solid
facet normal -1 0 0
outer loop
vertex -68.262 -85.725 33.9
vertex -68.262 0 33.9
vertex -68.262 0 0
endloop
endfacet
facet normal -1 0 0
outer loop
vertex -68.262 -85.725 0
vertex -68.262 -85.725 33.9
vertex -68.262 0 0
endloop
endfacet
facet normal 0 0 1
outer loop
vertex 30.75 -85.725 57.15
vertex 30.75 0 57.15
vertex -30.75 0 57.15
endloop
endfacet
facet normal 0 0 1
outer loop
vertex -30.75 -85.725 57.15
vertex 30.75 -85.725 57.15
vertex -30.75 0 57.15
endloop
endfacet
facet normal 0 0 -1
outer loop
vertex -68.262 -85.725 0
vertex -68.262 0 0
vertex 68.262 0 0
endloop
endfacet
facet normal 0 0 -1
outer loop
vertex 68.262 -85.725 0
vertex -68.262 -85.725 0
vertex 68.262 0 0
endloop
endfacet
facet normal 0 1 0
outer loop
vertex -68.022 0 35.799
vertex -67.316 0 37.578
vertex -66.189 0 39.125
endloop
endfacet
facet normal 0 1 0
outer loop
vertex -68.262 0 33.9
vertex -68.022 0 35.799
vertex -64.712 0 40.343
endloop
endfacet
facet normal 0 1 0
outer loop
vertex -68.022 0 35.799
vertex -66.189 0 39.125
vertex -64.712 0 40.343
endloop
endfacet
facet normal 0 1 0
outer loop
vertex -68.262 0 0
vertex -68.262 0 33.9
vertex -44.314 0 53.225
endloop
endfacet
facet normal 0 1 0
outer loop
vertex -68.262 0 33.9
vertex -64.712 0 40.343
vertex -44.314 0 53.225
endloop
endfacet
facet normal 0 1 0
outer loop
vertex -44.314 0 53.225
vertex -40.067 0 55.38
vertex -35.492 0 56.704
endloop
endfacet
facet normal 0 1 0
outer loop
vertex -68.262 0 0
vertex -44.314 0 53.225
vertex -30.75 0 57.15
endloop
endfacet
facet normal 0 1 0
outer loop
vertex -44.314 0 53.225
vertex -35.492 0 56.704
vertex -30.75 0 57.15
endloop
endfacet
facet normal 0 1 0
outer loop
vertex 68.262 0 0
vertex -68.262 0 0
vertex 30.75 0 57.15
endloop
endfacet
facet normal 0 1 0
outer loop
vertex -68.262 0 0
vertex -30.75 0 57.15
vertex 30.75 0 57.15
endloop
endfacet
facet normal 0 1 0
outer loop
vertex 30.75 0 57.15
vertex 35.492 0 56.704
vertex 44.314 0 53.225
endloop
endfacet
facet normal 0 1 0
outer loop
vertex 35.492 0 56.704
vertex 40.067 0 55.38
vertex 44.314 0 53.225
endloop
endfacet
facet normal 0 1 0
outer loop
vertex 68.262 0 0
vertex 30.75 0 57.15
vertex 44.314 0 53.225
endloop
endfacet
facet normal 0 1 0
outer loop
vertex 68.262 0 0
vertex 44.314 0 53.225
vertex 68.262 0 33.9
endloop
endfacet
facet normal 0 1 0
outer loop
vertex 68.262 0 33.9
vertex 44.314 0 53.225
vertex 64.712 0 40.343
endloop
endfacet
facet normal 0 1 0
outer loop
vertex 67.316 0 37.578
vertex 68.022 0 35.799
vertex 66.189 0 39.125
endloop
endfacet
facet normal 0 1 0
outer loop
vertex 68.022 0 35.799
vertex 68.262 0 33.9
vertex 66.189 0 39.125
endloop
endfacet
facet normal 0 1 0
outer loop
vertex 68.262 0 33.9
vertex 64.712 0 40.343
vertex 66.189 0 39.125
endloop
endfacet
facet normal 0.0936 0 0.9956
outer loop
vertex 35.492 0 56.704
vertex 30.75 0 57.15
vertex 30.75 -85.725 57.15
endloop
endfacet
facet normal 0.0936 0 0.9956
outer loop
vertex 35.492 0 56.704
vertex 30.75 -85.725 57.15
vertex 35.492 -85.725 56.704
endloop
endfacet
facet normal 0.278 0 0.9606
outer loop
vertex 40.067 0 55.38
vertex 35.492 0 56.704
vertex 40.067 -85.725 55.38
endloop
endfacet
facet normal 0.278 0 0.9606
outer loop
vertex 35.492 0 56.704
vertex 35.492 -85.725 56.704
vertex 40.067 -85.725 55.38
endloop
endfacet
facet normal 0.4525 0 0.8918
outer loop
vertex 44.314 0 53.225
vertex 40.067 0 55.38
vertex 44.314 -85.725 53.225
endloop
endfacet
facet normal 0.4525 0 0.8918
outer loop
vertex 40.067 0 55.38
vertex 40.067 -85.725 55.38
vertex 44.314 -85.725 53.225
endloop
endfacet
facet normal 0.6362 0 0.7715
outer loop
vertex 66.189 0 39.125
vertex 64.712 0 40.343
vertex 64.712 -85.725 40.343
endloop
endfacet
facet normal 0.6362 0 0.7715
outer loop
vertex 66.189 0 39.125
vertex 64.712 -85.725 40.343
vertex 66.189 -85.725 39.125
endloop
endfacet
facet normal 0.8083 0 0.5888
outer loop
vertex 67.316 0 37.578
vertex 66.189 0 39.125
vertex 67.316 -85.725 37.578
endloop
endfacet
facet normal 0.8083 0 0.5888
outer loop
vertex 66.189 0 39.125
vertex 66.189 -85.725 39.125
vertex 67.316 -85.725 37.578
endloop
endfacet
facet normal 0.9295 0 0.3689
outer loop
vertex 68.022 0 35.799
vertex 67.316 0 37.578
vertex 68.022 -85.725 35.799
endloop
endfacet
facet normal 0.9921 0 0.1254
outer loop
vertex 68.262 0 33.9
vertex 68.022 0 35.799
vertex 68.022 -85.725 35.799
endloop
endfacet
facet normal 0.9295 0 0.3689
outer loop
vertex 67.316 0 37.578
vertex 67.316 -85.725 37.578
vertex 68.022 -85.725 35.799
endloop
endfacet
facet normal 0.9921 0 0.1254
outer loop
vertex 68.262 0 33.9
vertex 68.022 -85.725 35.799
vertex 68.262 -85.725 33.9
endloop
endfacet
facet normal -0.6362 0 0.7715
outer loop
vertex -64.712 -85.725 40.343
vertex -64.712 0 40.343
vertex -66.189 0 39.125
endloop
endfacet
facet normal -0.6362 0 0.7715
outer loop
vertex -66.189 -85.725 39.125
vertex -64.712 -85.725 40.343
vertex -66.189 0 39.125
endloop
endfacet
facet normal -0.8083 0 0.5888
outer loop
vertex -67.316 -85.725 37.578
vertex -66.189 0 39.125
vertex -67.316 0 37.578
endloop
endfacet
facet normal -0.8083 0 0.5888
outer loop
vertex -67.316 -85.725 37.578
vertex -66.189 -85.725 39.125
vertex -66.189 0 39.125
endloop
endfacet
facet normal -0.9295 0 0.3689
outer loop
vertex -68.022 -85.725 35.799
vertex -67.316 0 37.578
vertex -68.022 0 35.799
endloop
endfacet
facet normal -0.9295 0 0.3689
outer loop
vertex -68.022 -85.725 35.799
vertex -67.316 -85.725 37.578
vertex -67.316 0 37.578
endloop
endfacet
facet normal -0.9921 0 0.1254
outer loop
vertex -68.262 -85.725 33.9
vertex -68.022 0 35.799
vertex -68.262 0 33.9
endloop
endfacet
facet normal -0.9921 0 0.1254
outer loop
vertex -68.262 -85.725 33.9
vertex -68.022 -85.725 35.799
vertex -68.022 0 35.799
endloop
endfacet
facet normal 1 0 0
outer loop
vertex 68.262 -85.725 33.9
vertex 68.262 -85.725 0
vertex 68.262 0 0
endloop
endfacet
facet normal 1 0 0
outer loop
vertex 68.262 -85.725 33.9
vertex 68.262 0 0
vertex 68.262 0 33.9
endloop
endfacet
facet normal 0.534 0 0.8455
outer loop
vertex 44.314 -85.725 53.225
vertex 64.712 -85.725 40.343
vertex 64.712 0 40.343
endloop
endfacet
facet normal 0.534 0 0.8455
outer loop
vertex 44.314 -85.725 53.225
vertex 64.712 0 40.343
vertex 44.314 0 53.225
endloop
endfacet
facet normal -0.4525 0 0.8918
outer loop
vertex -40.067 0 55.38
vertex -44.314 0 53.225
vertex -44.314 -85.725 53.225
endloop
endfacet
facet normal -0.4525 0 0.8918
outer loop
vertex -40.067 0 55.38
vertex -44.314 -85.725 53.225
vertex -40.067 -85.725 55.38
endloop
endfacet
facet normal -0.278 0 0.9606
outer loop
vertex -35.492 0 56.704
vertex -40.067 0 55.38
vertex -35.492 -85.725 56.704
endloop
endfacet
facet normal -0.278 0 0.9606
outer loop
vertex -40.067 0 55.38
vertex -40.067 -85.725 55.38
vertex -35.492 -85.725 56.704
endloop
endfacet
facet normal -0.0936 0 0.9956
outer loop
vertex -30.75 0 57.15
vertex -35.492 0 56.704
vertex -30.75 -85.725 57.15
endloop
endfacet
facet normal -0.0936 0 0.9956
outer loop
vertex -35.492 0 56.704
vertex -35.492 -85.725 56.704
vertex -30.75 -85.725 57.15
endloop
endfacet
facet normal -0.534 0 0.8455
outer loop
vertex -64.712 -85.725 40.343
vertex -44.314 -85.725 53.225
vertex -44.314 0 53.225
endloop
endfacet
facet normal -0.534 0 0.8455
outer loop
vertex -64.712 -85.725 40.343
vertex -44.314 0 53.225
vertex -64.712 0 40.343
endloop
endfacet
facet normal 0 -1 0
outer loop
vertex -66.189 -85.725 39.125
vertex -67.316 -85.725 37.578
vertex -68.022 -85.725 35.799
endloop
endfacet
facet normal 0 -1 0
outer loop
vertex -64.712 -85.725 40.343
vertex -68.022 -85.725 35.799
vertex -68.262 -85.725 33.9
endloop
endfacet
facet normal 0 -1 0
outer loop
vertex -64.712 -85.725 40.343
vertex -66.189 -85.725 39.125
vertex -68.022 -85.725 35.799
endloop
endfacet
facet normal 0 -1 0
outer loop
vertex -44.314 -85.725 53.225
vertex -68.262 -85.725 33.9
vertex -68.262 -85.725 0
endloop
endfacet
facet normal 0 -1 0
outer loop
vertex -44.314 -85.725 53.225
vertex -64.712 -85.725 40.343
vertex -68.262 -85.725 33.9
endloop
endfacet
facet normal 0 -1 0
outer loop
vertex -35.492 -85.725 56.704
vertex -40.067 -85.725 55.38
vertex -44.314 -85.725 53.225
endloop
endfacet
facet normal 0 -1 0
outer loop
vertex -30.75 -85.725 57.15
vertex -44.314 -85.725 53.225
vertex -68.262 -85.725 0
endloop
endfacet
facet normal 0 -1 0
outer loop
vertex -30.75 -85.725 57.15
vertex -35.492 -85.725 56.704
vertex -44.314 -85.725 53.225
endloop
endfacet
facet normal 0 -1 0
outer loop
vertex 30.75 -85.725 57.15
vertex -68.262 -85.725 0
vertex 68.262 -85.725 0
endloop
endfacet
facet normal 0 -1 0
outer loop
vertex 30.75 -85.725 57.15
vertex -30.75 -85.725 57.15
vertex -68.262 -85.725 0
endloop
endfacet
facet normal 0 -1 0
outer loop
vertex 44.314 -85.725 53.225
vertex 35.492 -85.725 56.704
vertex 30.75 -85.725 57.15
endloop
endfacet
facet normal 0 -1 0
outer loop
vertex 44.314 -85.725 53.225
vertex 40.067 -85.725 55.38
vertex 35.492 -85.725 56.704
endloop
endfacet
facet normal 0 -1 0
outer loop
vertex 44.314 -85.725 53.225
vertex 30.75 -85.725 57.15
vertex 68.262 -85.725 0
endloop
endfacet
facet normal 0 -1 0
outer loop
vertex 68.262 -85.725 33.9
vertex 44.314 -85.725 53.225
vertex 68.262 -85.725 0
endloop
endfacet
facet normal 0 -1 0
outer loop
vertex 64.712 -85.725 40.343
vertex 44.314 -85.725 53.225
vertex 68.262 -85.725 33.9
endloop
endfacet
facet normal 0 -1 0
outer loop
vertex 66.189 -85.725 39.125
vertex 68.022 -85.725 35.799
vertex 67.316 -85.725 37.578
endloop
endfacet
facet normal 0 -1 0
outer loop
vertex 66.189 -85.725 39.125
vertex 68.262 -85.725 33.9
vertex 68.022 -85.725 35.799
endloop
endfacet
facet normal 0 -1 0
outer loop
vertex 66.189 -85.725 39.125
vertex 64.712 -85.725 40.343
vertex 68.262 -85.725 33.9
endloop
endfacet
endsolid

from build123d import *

# Parameters (mm, degrees)
F1_DEPTH = 85.725
F2_R     = 7.62
F3_R     = 25.4
F4_R     = 25.4
F5_R     = 7.62


with BuildPart() as f1:
    # F0 (on Front) → F1 (new body)
    with BuildSketch(Plane.XZ):
        Polygon((-68.2625, 0), (0, 0), (68.2625, 0), (68.2625, 38.1), (38.1, 57.15), (0, 57.15), (-38.1, 57.15), (-68.2625, 38.1), align=None)
    extrude(amount=F1_DEPTH)

    # F2
    f2_edges = [f1.edges().sort_by_distance(p)[0] for p in [
        (-68.2625, -42.8625, 38.1),
    ]]
    fillet(f2_edges, radius=F2_R)

    # F3
    f3_edges = [f1.edges().sort_by_distance(p)[0] for p in [
        (-38.1, -42.8625, 57.15),
    ]]
    fillet(f3_edges, radius=F3_R)

    # F4
    f4_edges = [f1.edges().sort_by_distance(p)[0] for p in [
        (38.1, -42.8625, 57.15),
    ]]
    fillet(f4_edges, radius=F4_R)

    # F5
    f5_edges = [f1.edges().sort_by_distance(p)[0] for p in [
        (68.2625, -42.8625, 38.1),
    ]]
    fillet(f5_edges, radius=F5_R)


solid = f1.part
